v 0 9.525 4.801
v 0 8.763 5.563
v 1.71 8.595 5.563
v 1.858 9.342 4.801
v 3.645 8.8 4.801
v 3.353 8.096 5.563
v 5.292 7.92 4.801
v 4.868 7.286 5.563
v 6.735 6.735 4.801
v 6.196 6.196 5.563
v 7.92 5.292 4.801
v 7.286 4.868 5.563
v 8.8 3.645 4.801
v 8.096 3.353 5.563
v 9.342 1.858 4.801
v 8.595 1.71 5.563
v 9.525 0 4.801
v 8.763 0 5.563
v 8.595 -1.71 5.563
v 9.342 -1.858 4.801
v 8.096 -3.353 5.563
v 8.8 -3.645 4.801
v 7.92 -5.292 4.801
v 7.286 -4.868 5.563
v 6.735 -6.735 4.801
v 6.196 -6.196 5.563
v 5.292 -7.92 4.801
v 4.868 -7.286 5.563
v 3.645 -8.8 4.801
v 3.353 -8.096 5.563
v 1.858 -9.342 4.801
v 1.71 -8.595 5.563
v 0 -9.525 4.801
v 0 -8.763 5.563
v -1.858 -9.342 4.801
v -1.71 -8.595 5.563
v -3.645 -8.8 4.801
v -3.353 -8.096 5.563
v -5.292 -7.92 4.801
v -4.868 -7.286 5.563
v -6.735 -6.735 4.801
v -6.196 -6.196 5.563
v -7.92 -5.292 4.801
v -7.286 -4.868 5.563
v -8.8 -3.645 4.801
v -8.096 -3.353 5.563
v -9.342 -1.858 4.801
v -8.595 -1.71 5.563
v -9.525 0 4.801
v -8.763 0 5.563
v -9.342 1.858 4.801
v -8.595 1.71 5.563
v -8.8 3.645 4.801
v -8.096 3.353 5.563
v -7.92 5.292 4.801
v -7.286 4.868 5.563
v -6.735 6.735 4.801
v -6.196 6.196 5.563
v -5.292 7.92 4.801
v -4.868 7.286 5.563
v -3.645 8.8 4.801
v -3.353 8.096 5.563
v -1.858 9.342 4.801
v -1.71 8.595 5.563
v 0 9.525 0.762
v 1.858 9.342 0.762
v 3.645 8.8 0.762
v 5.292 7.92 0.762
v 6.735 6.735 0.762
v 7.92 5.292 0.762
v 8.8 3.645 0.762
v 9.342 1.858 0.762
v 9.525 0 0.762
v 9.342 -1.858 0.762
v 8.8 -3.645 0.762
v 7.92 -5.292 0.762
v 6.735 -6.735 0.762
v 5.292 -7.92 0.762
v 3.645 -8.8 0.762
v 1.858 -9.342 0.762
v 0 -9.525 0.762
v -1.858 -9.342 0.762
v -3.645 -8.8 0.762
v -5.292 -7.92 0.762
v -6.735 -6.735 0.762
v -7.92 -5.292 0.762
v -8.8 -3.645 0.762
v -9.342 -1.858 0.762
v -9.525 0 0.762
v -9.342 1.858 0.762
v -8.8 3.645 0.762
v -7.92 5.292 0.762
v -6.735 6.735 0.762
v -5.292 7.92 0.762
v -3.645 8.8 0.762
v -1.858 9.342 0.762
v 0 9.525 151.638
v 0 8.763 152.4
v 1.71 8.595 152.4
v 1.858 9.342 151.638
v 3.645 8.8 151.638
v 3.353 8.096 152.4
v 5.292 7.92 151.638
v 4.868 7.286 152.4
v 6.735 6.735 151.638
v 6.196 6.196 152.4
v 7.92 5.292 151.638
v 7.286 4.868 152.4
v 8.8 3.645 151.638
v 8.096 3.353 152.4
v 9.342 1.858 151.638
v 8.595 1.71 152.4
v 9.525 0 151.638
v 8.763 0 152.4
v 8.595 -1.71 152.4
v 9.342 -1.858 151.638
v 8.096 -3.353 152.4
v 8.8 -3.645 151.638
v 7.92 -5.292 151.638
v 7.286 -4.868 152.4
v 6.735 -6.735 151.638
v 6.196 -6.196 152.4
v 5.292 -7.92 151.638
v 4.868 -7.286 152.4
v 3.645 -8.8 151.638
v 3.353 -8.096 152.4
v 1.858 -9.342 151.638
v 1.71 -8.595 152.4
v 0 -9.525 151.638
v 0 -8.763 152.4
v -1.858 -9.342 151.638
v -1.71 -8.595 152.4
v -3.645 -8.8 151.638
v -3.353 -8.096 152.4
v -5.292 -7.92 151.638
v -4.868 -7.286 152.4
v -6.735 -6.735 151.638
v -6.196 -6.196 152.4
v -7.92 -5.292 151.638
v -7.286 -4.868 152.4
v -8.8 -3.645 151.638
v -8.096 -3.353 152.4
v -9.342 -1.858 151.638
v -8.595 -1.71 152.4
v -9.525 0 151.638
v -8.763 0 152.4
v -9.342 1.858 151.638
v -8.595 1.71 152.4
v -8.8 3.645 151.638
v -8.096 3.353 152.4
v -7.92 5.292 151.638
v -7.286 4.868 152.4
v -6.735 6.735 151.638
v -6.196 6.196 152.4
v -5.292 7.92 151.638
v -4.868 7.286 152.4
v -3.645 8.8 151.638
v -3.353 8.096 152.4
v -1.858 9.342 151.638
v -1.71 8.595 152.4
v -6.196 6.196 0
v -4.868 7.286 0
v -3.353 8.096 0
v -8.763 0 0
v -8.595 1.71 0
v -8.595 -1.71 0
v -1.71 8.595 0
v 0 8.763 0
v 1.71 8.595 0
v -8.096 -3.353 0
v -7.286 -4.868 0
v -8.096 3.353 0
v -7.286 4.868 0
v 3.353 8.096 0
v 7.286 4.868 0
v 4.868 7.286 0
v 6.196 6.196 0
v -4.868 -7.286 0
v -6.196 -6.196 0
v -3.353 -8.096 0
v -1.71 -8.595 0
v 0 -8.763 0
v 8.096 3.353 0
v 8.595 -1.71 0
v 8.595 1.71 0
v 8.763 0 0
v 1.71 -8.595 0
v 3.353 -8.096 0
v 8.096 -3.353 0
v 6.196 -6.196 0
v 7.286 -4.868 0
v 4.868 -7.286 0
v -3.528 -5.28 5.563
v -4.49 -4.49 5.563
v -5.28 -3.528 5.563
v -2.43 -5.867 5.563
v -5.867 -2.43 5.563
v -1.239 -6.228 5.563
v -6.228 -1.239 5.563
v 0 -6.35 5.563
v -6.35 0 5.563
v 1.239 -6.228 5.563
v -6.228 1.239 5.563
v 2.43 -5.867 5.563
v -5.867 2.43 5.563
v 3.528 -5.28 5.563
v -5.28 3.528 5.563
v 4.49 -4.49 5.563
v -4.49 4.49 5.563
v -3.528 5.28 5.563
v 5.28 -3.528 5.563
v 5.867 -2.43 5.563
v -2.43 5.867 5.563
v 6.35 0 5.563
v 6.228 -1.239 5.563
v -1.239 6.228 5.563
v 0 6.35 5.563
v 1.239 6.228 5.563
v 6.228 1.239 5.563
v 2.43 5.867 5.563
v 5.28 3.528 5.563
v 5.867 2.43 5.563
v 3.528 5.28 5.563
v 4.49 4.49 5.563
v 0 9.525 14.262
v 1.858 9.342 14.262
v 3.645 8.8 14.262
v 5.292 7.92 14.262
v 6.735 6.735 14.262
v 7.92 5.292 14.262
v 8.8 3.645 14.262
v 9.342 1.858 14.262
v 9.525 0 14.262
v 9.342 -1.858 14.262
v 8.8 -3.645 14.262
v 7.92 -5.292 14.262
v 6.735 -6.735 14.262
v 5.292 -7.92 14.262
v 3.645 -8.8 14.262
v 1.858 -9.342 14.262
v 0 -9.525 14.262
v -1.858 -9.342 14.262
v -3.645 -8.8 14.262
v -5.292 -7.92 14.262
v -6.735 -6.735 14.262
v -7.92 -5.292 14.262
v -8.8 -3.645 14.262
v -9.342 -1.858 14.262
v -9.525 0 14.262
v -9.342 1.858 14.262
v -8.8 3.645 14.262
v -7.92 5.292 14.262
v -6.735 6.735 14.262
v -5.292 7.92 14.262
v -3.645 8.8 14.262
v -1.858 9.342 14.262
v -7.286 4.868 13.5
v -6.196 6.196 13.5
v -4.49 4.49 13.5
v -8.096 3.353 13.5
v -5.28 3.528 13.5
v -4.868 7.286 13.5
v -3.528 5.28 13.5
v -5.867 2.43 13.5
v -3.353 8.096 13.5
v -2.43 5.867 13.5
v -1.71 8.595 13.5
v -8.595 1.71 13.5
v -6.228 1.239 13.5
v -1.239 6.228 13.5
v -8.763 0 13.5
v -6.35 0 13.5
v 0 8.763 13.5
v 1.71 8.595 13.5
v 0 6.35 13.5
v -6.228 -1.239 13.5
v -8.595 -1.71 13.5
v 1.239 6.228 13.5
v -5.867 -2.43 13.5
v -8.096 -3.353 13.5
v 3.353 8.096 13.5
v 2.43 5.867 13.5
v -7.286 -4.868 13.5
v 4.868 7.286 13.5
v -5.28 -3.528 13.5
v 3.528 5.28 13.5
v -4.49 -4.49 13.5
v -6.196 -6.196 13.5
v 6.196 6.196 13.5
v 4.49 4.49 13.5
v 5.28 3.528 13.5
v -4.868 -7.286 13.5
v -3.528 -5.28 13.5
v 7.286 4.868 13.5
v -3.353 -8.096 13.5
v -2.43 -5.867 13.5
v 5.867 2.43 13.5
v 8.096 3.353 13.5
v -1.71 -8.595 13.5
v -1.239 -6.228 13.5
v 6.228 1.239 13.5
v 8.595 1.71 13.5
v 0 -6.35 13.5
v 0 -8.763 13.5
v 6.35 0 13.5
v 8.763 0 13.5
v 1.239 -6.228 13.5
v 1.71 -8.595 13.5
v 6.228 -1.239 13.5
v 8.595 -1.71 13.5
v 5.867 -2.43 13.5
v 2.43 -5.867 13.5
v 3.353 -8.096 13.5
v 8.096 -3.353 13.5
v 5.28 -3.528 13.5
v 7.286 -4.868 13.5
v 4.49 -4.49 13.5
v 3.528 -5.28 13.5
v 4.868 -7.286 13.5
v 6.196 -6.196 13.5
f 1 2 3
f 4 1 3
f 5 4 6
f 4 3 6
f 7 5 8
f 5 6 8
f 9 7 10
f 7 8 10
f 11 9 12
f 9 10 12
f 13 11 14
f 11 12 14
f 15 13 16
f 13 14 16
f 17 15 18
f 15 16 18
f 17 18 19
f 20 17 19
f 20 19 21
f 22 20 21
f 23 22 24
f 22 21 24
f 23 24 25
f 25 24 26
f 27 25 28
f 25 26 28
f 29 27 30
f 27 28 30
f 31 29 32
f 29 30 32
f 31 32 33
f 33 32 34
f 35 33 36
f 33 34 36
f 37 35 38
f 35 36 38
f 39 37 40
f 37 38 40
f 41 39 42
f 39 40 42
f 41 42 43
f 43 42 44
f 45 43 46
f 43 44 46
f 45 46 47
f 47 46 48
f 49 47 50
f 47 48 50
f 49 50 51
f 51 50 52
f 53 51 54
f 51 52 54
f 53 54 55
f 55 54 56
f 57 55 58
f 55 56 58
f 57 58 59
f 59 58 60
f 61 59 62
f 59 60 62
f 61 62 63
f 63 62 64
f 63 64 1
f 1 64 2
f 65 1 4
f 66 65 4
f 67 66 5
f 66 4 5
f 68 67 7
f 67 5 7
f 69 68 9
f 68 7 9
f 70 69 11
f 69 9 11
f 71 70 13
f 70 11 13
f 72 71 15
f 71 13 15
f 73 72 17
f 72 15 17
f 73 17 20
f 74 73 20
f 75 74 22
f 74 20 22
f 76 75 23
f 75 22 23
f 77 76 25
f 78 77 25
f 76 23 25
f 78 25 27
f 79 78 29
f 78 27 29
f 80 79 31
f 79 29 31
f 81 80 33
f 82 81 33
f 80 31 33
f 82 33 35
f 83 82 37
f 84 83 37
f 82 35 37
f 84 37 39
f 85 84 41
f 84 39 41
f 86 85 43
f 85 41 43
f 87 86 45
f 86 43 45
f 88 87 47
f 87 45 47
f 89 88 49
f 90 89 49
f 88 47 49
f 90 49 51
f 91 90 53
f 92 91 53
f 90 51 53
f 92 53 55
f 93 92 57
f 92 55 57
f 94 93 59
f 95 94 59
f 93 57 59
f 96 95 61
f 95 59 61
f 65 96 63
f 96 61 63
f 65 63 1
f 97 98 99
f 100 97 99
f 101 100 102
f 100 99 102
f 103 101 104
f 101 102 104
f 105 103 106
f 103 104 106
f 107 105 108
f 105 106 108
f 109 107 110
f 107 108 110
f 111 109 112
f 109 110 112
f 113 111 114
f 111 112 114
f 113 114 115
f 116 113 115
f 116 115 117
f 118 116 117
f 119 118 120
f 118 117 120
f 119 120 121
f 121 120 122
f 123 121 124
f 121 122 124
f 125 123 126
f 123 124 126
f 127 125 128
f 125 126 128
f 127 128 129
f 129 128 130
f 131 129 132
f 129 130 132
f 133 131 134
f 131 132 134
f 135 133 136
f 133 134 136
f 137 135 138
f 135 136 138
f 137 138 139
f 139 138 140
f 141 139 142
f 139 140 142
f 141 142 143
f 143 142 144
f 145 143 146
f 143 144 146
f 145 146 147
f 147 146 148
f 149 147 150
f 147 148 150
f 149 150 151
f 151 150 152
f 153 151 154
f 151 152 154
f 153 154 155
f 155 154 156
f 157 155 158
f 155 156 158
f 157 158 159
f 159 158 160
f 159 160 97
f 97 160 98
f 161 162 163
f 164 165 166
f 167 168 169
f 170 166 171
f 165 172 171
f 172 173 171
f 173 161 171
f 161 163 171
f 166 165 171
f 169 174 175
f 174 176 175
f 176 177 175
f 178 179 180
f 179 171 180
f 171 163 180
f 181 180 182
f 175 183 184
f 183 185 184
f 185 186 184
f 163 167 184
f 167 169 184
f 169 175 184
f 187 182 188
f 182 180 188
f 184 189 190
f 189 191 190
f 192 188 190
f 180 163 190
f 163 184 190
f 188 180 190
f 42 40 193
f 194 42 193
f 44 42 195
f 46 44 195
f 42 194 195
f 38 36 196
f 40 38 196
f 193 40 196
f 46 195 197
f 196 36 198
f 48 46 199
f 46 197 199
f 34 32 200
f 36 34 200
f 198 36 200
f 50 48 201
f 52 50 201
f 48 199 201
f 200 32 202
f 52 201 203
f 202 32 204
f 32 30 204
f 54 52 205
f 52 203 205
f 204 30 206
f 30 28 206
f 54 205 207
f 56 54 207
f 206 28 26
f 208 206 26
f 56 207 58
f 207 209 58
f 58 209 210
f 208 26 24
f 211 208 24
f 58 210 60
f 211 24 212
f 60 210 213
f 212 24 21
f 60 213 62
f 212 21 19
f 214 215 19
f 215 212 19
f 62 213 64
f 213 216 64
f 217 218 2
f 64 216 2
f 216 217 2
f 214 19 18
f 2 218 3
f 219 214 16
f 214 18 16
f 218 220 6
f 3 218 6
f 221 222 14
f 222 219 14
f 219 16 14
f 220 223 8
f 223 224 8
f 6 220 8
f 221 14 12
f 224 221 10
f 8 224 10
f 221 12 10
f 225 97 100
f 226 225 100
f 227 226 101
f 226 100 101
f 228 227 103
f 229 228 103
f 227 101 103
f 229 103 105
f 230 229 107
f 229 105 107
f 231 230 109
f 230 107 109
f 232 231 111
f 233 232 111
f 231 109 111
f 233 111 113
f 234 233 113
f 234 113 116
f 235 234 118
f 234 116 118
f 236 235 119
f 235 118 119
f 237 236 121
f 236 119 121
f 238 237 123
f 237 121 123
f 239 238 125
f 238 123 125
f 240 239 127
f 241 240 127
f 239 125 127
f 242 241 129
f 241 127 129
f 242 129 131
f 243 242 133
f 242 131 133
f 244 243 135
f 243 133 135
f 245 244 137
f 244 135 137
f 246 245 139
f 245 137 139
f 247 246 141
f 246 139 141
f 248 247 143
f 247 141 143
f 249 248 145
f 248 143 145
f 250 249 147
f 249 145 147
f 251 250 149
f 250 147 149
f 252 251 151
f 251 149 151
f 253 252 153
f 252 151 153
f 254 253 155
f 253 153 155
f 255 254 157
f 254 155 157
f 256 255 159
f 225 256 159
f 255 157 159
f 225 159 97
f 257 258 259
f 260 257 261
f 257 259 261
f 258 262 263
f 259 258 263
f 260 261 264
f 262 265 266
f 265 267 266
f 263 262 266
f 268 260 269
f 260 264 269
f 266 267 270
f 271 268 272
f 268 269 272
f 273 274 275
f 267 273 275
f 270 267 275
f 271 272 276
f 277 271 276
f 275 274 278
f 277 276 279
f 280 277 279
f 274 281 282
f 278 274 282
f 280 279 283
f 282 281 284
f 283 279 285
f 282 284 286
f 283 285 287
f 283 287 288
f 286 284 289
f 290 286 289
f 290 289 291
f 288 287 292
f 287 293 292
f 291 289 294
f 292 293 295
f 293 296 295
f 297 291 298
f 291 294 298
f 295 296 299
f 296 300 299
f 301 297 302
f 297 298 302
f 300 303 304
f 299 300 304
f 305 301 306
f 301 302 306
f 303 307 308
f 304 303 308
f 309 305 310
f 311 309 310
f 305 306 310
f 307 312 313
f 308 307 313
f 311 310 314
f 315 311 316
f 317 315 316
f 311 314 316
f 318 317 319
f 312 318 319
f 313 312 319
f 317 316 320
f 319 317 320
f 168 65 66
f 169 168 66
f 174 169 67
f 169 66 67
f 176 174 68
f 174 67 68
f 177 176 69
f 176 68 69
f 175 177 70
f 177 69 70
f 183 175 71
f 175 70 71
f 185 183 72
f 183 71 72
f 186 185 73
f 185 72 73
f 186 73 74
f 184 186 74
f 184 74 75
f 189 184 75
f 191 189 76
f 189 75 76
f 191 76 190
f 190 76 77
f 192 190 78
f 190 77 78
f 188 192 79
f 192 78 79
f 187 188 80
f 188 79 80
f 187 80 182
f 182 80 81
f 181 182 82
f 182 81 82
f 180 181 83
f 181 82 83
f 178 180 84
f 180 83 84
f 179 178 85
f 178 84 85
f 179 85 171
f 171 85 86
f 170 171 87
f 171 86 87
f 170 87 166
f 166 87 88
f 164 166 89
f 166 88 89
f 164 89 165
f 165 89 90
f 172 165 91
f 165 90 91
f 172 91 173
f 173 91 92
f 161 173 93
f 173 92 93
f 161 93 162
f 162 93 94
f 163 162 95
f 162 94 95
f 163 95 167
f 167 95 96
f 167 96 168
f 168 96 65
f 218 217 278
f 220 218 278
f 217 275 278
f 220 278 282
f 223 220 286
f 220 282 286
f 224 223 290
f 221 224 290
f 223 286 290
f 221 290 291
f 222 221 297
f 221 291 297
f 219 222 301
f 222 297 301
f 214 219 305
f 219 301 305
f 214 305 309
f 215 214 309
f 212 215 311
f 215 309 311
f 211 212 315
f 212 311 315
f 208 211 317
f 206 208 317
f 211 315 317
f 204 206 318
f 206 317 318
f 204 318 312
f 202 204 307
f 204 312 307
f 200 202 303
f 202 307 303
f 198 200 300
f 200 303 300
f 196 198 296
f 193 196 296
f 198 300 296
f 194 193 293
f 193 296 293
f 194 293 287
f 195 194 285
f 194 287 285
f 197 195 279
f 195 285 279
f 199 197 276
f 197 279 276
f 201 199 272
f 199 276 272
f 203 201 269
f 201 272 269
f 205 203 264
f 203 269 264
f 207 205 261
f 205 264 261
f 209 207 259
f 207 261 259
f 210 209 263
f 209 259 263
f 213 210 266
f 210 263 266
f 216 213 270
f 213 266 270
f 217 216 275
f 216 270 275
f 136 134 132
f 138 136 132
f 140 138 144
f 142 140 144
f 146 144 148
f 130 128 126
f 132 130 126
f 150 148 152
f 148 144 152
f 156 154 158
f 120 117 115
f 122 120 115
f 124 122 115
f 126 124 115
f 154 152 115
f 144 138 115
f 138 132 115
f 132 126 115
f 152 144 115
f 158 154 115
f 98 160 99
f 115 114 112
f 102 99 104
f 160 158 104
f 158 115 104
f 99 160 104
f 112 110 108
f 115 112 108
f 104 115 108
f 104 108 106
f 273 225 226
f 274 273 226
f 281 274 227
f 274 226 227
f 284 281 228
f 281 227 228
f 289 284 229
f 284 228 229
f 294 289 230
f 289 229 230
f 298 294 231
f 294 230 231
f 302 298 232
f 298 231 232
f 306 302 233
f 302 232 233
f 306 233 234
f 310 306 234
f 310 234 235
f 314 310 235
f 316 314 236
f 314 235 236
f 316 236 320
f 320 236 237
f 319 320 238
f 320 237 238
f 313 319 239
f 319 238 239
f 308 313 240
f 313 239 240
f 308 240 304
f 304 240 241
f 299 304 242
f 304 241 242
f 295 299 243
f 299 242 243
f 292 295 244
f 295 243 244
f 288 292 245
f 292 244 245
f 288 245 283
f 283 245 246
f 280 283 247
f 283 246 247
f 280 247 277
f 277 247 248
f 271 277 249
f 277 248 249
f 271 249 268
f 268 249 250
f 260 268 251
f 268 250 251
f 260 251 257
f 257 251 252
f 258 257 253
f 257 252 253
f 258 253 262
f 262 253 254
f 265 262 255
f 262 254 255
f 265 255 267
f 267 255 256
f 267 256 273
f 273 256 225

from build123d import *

# Parameters (mm, degrees)
F2_SIZE = 0.762


with BuildPart() as f1:
    # F0 (on Right) → F1 (revolve)
    with BuildSketch(Plane.YZ):
        Polygon((0, 152.4), (0, 0), (9.525, 0), (9.525, 5.5626), (6.35, 5.5626), (6.35, 13.5001), (9.525, 13.5001), (9.525, 152.4), align=None)
    revolve(axis=Axis((0, 0, 76.2), (0, 0, -1)))

    # F2
    f2_edges = [f1.edges().sort_by_distance(p)[0] for p in [
        (0, -9.525, 152.4),
        (0, -9.525, 5.5626),
        (0, -9.525, 13.5001),
        (0, -9.525, 0),
    ]]
    chamfer(f2_edges, length=F2_SIZE)


solid = f1.part
